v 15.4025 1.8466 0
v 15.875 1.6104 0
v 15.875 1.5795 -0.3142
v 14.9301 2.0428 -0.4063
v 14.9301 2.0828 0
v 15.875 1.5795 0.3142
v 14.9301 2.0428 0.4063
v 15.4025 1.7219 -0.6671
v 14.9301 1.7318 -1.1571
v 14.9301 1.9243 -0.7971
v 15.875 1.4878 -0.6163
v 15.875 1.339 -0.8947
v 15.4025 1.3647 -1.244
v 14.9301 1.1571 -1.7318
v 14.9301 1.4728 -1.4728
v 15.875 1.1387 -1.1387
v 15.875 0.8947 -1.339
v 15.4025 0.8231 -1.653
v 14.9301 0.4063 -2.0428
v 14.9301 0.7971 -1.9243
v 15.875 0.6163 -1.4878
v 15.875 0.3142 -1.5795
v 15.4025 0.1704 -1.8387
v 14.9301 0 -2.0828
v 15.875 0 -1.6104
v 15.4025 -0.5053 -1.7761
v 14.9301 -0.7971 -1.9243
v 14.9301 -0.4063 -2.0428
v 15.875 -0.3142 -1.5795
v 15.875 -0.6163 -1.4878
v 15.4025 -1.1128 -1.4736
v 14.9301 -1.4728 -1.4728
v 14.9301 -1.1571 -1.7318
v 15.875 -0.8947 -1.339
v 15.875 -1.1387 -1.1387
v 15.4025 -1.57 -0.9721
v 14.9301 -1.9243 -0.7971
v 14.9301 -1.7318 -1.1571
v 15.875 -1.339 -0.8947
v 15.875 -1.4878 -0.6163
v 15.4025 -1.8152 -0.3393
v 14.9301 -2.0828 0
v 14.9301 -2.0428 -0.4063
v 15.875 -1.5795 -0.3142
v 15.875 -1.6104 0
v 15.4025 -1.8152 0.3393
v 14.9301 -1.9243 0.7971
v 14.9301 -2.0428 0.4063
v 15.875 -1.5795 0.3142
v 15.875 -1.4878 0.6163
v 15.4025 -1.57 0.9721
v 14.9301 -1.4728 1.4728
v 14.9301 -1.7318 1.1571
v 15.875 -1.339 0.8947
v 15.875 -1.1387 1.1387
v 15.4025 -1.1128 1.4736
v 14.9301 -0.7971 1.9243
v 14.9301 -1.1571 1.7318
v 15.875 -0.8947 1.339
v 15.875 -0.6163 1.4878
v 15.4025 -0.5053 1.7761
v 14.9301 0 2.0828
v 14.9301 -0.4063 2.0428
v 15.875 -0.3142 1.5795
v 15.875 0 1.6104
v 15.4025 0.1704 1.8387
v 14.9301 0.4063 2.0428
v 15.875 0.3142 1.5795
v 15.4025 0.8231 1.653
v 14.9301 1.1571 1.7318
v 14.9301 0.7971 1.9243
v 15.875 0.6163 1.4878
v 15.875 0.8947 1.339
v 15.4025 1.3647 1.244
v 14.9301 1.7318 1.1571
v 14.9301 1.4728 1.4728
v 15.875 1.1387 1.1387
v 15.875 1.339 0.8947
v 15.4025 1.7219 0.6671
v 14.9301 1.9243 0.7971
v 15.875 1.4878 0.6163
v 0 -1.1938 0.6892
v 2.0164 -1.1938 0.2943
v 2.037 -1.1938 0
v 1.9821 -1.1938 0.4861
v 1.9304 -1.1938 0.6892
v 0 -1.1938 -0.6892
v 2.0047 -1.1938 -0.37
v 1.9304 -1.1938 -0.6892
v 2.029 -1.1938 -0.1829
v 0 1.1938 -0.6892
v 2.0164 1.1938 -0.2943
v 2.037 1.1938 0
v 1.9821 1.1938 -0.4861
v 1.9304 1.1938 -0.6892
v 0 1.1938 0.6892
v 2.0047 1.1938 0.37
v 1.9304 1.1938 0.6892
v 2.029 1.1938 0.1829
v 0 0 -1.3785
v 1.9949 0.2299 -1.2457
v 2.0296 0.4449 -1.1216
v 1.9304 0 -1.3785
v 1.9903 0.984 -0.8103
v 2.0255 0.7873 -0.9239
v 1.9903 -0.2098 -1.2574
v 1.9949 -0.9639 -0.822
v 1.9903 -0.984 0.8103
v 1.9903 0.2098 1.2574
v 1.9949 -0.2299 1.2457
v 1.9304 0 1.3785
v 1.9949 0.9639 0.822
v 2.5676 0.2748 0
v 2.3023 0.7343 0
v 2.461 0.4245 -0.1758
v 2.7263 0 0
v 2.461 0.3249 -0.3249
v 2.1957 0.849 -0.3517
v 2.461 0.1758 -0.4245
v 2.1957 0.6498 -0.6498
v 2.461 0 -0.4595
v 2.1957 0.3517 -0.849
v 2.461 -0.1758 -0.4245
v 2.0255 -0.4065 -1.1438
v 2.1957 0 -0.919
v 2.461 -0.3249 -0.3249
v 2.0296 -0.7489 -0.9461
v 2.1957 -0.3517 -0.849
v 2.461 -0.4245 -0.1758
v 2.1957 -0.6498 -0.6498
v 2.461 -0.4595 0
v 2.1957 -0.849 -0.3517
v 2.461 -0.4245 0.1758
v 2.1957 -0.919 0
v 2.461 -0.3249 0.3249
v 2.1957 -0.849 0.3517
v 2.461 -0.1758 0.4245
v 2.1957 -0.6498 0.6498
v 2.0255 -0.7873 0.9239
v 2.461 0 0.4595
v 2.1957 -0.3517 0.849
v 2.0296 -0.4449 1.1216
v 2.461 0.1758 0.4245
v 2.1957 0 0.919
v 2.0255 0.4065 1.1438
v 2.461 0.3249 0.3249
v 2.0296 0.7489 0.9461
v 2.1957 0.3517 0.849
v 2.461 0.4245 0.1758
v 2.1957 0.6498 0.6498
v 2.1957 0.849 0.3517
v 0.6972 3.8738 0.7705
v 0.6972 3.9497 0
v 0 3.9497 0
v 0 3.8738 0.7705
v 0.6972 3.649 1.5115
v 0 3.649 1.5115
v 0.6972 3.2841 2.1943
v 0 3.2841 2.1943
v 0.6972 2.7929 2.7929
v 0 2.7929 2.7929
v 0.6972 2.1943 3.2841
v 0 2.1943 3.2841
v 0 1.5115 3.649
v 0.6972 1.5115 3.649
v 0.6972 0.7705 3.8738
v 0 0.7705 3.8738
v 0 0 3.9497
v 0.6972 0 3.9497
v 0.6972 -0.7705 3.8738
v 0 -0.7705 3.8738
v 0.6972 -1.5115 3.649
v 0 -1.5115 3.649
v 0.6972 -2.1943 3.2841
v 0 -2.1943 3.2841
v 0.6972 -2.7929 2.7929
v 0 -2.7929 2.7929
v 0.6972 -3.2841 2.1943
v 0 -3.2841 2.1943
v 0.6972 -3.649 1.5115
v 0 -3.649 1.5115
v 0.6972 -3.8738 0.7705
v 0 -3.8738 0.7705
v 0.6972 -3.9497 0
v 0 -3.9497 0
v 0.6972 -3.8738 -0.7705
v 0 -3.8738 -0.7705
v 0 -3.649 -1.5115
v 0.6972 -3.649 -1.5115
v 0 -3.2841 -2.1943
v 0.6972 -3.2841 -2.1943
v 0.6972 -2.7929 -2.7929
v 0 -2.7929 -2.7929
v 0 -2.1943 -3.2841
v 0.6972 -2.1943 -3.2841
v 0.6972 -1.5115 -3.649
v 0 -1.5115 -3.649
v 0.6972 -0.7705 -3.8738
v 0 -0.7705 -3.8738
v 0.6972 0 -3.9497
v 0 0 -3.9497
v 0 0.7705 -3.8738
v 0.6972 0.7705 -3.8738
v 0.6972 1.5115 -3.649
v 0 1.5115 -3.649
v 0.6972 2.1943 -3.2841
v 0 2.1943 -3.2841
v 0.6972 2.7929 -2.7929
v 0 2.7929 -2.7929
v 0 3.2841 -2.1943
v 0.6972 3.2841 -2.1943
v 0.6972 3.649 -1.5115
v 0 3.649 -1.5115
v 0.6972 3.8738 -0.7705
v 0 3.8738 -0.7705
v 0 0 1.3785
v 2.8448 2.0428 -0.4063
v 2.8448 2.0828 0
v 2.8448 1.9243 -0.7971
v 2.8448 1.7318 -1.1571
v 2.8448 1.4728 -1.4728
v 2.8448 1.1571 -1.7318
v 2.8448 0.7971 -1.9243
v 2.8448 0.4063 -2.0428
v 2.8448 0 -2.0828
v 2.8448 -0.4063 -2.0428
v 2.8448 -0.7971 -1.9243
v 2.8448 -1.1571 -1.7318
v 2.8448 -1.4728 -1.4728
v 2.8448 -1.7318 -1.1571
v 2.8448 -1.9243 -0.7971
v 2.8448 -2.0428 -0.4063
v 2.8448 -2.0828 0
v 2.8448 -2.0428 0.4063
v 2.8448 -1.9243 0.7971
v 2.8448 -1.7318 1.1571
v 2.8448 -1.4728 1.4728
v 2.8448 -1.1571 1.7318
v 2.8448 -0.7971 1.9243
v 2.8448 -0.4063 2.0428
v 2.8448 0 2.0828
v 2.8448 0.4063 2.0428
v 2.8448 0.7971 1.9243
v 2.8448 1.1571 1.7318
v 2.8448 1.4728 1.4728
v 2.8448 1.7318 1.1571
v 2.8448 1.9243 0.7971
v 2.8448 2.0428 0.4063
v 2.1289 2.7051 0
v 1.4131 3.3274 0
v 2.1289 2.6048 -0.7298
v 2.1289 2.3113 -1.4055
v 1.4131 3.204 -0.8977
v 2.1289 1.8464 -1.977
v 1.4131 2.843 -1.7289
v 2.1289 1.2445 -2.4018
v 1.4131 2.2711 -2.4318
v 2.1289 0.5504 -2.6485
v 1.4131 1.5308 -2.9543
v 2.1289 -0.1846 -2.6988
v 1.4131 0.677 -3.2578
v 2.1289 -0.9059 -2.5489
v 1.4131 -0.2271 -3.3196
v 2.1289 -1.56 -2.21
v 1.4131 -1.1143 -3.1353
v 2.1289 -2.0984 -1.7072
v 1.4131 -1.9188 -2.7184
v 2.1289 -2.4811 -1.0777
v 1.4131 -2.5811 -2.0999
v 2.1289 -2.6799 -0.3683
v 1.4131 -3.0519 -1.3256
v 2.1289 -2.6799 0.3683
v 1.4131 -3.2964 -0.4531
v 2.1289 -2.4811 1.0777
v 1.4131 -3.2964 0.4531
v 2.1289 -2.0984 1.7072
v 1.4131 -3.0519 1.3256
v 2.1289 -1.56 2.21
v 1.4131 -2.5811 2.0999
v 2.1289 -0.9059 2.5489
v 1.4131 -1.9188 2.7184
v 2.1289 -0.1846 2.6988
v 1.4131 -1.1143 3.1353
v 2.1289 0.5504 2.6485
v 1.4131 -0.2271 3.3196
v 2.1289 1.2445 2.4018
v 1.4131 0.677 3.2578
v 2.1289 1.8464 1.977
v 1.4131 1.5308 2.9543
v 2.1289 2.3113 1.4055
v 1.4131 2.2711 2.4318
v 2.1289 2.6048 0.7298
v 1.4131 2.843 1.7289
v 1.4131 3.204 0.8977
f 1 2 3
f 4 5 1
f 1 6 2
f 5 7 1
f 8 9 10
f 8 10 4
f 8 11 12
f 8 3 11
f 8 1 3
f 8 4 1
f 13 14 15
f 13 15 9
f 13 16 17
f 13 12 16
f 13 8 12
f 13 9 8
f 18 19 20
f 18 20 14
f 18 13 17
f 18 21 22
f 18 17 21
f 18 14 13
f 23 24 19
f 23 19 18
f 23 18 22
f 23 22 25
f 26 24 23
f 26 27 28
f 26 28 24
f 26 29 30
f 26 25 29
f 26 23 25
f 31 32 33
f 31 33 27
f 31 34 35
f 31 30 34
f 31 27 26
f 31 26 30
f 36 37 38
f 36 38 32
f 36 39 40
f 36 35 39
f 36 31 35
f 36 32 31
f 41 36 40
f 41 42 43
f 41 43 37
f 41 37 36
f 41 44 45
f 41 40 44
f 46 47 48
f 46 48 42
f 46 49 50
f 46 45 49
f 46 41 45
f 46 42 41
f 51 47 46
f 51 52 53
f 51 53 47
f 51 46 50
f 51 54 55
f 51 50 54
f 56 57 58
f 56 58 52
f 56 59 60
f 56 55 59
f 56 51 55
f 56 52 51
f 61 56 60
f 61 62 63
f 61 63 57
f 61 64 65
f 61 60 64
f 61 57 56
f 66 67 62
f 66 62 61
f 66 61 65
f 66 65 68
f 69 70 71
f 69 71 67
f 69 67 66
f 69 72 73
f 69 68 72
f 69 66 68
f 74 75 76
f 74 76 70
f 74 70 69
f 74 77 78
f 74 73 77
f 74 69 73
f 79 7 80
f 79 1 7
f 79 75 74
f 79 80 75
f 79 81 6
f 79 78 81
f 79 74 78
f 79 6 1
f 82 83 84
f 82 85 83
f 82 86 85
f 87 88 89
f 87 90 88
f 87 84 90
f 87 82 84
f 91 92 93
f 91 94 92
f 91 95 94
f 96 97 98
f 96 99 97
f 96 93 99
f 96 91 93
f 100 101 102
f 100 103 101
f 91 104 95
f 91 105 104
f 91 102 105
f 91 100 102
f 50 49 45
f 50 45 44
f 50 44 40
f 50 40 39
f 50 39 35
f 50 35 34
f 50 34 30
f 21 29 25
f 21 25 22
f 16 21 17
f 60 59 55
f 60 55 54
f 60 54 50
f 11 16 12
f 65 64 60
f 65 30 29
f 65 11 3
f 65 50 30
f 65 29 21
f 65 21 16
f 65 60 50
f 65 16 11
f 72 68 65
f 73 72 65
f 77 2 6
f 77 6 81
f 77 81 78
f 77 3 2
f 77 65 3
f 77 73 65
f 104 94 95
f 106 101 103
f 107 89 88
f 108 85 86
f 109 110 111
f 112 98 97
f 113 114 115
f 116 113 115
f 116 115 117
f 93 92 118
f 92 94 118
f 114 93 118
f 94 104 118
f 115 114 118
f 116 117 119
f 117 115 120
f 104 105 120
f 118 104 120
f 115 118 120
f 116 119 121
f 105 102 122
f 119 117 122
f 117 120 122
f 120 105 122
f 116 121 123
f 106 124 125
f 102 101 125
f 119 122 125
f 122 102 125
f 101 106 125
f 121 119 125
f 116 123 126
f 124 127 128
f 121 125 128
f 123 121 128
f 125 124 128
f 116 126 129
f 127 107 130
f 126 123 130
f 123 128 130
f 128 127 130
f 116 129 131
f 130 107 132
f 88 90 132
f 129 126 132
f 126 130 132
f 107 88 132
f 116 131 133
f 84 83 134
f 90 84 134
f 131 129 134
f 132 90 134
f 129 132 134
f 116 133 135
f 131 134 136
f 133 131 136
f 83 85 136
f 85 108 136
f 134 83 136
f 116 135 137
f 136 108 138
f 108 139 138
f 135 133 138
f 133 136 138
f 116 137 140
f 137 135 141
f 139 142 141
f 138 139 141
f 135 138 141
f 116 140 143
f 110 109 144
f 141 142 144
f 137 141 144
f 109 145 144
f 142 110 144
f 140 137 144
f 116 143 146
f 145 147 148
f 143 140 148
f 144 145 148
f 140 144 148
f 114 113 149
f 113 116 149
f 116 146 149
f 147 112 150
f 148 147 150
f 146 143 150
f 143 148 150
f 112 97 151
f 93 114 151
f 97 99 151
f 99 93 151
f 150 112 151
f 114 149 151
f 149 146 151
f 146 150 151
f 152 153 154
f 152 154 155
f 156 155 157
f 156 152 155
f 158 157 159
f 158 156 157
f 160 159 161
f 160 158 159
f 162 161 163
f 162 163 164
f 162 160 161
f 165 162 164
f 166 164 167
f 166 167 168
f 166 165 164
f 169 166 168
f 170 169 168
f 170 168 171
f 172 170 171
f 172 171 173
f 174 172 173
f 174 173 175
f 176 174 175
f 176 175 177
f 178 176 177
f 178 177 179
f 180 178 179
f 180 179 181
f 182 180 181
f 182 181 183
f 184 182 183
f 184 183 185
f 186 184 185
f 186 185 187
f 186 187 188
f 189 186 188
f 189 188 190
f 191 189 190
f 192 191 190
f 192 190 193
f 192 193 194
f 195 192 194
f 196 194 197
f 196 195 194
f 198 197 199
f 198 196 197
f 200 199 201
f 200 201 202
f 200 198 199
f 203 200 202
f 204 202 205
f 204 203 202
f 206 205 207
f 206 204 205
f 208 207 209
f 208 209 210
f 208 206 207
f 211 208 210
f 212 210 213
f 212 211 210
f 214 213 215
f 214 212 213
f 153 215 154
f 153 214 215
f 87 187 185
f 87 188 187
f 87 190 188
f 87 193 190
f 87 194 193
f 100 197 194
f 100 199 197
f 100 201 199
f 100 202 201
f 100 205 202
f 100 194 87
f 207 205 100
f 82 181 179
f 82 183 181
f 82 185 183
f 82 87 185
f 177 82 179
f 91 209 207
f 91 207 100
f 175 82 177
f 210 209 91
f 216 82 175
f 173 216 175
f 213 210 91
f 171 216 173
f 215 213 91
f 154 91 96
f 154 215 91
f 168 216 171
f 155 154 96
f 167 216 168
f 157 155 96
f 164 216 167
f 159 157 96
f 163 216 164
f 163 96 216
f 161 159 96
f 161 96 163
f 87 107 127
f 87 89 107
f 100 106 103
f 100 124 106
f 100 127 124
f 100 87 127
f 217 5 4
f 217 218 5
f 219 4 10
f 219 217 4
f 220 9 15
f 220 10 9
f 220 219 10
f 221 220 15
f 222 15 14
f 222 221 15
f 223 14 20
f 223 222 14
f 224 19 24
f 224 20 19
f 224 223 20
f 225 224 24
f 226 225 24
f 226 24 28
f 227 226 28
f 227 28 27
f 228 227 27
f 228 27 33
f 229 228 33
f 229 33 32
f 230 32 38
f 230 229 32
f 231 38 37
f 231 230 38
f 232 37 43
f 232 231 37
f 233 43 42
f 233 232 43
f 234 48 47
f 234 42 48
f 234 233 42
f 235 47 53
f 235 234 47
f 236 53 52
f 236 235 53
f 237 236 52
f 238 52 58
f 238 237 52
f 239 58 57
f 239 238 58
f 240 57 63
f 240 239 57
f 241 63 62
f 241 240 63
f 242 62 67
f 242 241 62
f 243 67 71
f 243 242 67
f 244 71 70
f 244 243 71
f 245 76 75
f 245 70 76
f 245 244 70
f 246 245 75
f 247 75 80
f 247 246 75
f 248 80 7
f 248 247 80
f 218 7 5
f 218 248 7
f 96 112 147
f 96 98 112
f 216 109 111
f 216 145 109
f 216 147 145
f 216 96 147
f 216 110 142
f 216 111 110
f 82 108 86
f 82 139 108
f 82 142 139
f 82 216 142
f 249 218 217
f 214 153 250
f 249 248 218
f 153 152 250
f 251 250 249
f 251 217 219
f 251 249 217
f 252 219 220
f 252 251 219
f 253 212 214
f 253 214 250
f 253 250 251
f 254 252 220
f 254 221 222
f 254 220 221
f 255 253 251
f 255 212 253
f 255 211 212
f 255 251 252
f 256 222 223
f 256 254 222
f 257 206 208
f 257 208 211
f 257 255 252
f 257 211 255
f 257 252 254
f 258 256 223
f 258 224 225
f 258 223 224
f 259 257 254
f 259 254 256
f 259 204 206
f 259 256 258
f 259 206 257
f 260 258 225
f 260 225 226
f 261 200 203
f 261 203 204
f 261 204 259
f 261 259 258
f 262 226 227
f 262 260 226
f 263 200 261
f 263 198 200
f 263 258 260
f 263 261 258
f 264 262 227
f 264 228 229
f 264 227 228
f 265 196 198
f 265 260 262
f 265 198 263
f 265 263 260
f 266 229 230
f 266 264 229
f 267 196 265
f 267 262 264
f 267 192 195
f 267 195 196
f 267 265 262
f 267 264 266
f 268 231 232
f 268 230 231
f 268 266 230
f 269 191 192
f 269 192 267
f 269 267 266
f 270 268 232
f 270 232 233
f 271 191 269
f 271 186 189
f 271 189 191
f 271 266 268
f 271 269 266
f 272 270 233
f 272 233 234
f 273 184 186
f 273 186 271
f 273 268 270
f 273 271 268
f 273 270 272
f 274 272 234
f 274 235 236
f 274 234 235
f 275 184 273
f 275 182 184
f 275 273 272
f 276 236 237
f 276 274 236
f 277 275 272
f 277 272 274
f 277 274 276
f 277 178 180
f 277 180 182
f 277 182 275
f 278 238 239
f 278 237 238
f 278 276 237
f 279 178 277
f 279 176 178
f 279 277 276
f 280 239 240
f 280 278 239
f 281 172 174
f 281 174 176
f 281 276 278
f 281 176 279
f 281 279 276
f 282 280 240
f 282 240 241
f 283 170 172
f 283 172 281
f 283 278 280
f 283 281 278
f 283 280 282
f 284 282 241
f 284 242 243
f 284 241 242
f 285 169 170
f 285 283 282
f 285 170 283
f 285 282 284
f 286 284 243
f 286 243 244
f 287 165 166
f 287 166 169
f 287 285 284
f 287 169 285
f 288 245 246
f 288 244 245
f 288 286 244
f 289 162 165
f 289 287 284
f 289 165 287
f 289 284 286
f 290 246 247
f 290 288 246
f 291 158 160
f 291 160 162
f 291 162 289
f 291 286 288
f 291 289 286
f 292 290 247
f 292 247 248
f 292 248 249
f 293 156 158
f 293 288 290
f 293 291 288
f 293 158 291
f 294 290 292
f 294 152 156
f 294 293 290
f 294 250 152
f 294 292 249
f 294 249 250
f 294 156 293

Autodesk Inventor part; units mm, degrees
ref_plane "YZ Plane" through (0, 0, 0) normal (1, 0, 0) x (0, 1, 0)
ref_plane "XZ Plane" through (0, 0, 0) normal (0, 1, 0) x (-1, 0, 0)
sketch "Sketch1" plane through (0, 0, 0) normal (0, 0, 1) x (1, 0, 0)
  line L0 (15.875, 0) -> (15.875, 2.0828)
  line L1 (15.875, 2.0828) -> (4.8293, 2.0828)
  line L2 (4.8293, 2.0828) -> (2.8448, 2.0828)
  line L3 (0, 3.9497) -> (0, 1.3785)
  line L4 (0, 1.3785) -> (1.9304, 1.3785)
  line L5 (1.9304, 1.3785) -> (2.7263, 0)
  line L6 (2.7263, 0) -> (15.875, 0)
  line L7 (0, 3.9497) -> (0.6972, 3.9497)
  line L8 (0.6972, 3.9497) -> (2.8448, 2.0828)
  line L9 (2.8448, 2.0828) -> (2.8448, 2.0828)
  line L10 (4.8293, 2.0828) -> (2.8448, 2.0828) construction
  line L11 (2.8448, 2.0828) -> (2.8448, 2.0828)
  line L12 (-3.175, 0) -> (19.05, 0) projected
  line L13 (0, -0.7899) -> (0, 4.7396) projected
  dimension "d0" = 15.875
  dimension "d1" = 11.0457
  dimension "d2" = 1.9304
  dimension "d3" = 4.1656
  dimension "d6" = 2.8448
  dimension "d7" = 41
  dimension "d8" = 2.757
  dimension "d9" = 60
  dimension "d10" = 7.8994
  dimension "d11" = 4.1656
  dimension "d12" = 1.9845
revolve "Body" add sketch "Sketch1" angle 360 about axis through (2.7263, 0, 0) along (1, 0, 0) contours L6 L5 L4 L3 L7 L8 L2 L1 L0
sketch "Sketch2" plane through (0, 0, 0) normal (-1, 0, 0) x (0, 0, 1)
  circle A0 centre (0, 0) radius 1.3785 projected
  line L0 (0, -5.5296) -> (0, 5.5296) projected
  line L1 (-5.5296, 0) -> (5.5296, 0) projected
  line L2 (1.3785, 0) -> (0.6892, -1.1938)
  line L3 (0.6892, -1.1938) -> (-0.6892, -1.1938)
  line L4 (-0.6892, -1.1938) -> (-1.3785, 0)
  line L5 (-1.3785, 0) -> (-0.6892, 1.1938)
  line L6 (-0.6892, 1.1938) -> (0.6892, 1.1938)
  line L7 (0.6892, 1.1938) -> (1.3785, 0)
  point P0 (0, 1.3785)
extrude "Slot" add sketch "Sketch2" against normal up to next contours L7 A0 | A0 L2 | L6 L0 A0 | A0 L0 L3 | L0 L6 A0 | A0 L3 L0 | L4 A0 | A0 L5
thread "Thread" size "8-32 UNC" class "2A" standard "ANSI Unified Screw Threads" length 11.0457
chamfer "Chamfer1" distance 0.4724 distance2 0.9449 1 edges at (15.875, -2.0828, 0) measured on face at (15.875, 0.3944, 0.7269)
ref_plane "Work Plane1" through (104.775, 0, 0) normal (0, 0, -1) x (1, 0, 0)
equation "\"d15\" = GEL"
equation "\"d17\" = -0.5 * SPD + 0.5 * GD"
equation "\"d18\" = GUL"
equation "\"d0\" = NLG"
equation "\"d1\" = GEL"
equation "\"d2\" = INTI"
equation "\"d3\" = GD"
equation "\"d6\" = KOH"
equation "\"d7\" = 0.5 * SEWI"
equation "\"d8\" = 1.1547 * SW"
equation "\"d10\" = KOD"
equation "\"d11\" = BDM"
equation "\"d12\" = GAL"
equation "\"NLG\" = 15.875"
equation "\"INTI\" = 1.9304"
equation "\"GEL\" = 11.0457"
equation "\"GAL\" = 1.9845"
equation "\"KOH\" = 2.8448"
equation "\"KOD\" = 7.8994"
equation "\"GUL\" = 0.94488"
equation "\"SPD\" = 3.22072"
equation "\"BDM\" = NND"
equation "\"GD\" = NND"
equation "\"SEWI\" = 82deg"
equation "\"SW\" = 2.3876"
equation "\"TOA\" = 30deg"
equation "\"GD1\" = SPD"
equation "\"THREADDIA\" = 4.1656"
equation "\"HHPTC\" = 0.79375"
equation "\"NND\" = 4.1656"
equation "\"E0\" = 1.155 * SW"
properties part number "ANSI B18.3 - 8-32 UNC x 0.625" material "Steel, Mild"
